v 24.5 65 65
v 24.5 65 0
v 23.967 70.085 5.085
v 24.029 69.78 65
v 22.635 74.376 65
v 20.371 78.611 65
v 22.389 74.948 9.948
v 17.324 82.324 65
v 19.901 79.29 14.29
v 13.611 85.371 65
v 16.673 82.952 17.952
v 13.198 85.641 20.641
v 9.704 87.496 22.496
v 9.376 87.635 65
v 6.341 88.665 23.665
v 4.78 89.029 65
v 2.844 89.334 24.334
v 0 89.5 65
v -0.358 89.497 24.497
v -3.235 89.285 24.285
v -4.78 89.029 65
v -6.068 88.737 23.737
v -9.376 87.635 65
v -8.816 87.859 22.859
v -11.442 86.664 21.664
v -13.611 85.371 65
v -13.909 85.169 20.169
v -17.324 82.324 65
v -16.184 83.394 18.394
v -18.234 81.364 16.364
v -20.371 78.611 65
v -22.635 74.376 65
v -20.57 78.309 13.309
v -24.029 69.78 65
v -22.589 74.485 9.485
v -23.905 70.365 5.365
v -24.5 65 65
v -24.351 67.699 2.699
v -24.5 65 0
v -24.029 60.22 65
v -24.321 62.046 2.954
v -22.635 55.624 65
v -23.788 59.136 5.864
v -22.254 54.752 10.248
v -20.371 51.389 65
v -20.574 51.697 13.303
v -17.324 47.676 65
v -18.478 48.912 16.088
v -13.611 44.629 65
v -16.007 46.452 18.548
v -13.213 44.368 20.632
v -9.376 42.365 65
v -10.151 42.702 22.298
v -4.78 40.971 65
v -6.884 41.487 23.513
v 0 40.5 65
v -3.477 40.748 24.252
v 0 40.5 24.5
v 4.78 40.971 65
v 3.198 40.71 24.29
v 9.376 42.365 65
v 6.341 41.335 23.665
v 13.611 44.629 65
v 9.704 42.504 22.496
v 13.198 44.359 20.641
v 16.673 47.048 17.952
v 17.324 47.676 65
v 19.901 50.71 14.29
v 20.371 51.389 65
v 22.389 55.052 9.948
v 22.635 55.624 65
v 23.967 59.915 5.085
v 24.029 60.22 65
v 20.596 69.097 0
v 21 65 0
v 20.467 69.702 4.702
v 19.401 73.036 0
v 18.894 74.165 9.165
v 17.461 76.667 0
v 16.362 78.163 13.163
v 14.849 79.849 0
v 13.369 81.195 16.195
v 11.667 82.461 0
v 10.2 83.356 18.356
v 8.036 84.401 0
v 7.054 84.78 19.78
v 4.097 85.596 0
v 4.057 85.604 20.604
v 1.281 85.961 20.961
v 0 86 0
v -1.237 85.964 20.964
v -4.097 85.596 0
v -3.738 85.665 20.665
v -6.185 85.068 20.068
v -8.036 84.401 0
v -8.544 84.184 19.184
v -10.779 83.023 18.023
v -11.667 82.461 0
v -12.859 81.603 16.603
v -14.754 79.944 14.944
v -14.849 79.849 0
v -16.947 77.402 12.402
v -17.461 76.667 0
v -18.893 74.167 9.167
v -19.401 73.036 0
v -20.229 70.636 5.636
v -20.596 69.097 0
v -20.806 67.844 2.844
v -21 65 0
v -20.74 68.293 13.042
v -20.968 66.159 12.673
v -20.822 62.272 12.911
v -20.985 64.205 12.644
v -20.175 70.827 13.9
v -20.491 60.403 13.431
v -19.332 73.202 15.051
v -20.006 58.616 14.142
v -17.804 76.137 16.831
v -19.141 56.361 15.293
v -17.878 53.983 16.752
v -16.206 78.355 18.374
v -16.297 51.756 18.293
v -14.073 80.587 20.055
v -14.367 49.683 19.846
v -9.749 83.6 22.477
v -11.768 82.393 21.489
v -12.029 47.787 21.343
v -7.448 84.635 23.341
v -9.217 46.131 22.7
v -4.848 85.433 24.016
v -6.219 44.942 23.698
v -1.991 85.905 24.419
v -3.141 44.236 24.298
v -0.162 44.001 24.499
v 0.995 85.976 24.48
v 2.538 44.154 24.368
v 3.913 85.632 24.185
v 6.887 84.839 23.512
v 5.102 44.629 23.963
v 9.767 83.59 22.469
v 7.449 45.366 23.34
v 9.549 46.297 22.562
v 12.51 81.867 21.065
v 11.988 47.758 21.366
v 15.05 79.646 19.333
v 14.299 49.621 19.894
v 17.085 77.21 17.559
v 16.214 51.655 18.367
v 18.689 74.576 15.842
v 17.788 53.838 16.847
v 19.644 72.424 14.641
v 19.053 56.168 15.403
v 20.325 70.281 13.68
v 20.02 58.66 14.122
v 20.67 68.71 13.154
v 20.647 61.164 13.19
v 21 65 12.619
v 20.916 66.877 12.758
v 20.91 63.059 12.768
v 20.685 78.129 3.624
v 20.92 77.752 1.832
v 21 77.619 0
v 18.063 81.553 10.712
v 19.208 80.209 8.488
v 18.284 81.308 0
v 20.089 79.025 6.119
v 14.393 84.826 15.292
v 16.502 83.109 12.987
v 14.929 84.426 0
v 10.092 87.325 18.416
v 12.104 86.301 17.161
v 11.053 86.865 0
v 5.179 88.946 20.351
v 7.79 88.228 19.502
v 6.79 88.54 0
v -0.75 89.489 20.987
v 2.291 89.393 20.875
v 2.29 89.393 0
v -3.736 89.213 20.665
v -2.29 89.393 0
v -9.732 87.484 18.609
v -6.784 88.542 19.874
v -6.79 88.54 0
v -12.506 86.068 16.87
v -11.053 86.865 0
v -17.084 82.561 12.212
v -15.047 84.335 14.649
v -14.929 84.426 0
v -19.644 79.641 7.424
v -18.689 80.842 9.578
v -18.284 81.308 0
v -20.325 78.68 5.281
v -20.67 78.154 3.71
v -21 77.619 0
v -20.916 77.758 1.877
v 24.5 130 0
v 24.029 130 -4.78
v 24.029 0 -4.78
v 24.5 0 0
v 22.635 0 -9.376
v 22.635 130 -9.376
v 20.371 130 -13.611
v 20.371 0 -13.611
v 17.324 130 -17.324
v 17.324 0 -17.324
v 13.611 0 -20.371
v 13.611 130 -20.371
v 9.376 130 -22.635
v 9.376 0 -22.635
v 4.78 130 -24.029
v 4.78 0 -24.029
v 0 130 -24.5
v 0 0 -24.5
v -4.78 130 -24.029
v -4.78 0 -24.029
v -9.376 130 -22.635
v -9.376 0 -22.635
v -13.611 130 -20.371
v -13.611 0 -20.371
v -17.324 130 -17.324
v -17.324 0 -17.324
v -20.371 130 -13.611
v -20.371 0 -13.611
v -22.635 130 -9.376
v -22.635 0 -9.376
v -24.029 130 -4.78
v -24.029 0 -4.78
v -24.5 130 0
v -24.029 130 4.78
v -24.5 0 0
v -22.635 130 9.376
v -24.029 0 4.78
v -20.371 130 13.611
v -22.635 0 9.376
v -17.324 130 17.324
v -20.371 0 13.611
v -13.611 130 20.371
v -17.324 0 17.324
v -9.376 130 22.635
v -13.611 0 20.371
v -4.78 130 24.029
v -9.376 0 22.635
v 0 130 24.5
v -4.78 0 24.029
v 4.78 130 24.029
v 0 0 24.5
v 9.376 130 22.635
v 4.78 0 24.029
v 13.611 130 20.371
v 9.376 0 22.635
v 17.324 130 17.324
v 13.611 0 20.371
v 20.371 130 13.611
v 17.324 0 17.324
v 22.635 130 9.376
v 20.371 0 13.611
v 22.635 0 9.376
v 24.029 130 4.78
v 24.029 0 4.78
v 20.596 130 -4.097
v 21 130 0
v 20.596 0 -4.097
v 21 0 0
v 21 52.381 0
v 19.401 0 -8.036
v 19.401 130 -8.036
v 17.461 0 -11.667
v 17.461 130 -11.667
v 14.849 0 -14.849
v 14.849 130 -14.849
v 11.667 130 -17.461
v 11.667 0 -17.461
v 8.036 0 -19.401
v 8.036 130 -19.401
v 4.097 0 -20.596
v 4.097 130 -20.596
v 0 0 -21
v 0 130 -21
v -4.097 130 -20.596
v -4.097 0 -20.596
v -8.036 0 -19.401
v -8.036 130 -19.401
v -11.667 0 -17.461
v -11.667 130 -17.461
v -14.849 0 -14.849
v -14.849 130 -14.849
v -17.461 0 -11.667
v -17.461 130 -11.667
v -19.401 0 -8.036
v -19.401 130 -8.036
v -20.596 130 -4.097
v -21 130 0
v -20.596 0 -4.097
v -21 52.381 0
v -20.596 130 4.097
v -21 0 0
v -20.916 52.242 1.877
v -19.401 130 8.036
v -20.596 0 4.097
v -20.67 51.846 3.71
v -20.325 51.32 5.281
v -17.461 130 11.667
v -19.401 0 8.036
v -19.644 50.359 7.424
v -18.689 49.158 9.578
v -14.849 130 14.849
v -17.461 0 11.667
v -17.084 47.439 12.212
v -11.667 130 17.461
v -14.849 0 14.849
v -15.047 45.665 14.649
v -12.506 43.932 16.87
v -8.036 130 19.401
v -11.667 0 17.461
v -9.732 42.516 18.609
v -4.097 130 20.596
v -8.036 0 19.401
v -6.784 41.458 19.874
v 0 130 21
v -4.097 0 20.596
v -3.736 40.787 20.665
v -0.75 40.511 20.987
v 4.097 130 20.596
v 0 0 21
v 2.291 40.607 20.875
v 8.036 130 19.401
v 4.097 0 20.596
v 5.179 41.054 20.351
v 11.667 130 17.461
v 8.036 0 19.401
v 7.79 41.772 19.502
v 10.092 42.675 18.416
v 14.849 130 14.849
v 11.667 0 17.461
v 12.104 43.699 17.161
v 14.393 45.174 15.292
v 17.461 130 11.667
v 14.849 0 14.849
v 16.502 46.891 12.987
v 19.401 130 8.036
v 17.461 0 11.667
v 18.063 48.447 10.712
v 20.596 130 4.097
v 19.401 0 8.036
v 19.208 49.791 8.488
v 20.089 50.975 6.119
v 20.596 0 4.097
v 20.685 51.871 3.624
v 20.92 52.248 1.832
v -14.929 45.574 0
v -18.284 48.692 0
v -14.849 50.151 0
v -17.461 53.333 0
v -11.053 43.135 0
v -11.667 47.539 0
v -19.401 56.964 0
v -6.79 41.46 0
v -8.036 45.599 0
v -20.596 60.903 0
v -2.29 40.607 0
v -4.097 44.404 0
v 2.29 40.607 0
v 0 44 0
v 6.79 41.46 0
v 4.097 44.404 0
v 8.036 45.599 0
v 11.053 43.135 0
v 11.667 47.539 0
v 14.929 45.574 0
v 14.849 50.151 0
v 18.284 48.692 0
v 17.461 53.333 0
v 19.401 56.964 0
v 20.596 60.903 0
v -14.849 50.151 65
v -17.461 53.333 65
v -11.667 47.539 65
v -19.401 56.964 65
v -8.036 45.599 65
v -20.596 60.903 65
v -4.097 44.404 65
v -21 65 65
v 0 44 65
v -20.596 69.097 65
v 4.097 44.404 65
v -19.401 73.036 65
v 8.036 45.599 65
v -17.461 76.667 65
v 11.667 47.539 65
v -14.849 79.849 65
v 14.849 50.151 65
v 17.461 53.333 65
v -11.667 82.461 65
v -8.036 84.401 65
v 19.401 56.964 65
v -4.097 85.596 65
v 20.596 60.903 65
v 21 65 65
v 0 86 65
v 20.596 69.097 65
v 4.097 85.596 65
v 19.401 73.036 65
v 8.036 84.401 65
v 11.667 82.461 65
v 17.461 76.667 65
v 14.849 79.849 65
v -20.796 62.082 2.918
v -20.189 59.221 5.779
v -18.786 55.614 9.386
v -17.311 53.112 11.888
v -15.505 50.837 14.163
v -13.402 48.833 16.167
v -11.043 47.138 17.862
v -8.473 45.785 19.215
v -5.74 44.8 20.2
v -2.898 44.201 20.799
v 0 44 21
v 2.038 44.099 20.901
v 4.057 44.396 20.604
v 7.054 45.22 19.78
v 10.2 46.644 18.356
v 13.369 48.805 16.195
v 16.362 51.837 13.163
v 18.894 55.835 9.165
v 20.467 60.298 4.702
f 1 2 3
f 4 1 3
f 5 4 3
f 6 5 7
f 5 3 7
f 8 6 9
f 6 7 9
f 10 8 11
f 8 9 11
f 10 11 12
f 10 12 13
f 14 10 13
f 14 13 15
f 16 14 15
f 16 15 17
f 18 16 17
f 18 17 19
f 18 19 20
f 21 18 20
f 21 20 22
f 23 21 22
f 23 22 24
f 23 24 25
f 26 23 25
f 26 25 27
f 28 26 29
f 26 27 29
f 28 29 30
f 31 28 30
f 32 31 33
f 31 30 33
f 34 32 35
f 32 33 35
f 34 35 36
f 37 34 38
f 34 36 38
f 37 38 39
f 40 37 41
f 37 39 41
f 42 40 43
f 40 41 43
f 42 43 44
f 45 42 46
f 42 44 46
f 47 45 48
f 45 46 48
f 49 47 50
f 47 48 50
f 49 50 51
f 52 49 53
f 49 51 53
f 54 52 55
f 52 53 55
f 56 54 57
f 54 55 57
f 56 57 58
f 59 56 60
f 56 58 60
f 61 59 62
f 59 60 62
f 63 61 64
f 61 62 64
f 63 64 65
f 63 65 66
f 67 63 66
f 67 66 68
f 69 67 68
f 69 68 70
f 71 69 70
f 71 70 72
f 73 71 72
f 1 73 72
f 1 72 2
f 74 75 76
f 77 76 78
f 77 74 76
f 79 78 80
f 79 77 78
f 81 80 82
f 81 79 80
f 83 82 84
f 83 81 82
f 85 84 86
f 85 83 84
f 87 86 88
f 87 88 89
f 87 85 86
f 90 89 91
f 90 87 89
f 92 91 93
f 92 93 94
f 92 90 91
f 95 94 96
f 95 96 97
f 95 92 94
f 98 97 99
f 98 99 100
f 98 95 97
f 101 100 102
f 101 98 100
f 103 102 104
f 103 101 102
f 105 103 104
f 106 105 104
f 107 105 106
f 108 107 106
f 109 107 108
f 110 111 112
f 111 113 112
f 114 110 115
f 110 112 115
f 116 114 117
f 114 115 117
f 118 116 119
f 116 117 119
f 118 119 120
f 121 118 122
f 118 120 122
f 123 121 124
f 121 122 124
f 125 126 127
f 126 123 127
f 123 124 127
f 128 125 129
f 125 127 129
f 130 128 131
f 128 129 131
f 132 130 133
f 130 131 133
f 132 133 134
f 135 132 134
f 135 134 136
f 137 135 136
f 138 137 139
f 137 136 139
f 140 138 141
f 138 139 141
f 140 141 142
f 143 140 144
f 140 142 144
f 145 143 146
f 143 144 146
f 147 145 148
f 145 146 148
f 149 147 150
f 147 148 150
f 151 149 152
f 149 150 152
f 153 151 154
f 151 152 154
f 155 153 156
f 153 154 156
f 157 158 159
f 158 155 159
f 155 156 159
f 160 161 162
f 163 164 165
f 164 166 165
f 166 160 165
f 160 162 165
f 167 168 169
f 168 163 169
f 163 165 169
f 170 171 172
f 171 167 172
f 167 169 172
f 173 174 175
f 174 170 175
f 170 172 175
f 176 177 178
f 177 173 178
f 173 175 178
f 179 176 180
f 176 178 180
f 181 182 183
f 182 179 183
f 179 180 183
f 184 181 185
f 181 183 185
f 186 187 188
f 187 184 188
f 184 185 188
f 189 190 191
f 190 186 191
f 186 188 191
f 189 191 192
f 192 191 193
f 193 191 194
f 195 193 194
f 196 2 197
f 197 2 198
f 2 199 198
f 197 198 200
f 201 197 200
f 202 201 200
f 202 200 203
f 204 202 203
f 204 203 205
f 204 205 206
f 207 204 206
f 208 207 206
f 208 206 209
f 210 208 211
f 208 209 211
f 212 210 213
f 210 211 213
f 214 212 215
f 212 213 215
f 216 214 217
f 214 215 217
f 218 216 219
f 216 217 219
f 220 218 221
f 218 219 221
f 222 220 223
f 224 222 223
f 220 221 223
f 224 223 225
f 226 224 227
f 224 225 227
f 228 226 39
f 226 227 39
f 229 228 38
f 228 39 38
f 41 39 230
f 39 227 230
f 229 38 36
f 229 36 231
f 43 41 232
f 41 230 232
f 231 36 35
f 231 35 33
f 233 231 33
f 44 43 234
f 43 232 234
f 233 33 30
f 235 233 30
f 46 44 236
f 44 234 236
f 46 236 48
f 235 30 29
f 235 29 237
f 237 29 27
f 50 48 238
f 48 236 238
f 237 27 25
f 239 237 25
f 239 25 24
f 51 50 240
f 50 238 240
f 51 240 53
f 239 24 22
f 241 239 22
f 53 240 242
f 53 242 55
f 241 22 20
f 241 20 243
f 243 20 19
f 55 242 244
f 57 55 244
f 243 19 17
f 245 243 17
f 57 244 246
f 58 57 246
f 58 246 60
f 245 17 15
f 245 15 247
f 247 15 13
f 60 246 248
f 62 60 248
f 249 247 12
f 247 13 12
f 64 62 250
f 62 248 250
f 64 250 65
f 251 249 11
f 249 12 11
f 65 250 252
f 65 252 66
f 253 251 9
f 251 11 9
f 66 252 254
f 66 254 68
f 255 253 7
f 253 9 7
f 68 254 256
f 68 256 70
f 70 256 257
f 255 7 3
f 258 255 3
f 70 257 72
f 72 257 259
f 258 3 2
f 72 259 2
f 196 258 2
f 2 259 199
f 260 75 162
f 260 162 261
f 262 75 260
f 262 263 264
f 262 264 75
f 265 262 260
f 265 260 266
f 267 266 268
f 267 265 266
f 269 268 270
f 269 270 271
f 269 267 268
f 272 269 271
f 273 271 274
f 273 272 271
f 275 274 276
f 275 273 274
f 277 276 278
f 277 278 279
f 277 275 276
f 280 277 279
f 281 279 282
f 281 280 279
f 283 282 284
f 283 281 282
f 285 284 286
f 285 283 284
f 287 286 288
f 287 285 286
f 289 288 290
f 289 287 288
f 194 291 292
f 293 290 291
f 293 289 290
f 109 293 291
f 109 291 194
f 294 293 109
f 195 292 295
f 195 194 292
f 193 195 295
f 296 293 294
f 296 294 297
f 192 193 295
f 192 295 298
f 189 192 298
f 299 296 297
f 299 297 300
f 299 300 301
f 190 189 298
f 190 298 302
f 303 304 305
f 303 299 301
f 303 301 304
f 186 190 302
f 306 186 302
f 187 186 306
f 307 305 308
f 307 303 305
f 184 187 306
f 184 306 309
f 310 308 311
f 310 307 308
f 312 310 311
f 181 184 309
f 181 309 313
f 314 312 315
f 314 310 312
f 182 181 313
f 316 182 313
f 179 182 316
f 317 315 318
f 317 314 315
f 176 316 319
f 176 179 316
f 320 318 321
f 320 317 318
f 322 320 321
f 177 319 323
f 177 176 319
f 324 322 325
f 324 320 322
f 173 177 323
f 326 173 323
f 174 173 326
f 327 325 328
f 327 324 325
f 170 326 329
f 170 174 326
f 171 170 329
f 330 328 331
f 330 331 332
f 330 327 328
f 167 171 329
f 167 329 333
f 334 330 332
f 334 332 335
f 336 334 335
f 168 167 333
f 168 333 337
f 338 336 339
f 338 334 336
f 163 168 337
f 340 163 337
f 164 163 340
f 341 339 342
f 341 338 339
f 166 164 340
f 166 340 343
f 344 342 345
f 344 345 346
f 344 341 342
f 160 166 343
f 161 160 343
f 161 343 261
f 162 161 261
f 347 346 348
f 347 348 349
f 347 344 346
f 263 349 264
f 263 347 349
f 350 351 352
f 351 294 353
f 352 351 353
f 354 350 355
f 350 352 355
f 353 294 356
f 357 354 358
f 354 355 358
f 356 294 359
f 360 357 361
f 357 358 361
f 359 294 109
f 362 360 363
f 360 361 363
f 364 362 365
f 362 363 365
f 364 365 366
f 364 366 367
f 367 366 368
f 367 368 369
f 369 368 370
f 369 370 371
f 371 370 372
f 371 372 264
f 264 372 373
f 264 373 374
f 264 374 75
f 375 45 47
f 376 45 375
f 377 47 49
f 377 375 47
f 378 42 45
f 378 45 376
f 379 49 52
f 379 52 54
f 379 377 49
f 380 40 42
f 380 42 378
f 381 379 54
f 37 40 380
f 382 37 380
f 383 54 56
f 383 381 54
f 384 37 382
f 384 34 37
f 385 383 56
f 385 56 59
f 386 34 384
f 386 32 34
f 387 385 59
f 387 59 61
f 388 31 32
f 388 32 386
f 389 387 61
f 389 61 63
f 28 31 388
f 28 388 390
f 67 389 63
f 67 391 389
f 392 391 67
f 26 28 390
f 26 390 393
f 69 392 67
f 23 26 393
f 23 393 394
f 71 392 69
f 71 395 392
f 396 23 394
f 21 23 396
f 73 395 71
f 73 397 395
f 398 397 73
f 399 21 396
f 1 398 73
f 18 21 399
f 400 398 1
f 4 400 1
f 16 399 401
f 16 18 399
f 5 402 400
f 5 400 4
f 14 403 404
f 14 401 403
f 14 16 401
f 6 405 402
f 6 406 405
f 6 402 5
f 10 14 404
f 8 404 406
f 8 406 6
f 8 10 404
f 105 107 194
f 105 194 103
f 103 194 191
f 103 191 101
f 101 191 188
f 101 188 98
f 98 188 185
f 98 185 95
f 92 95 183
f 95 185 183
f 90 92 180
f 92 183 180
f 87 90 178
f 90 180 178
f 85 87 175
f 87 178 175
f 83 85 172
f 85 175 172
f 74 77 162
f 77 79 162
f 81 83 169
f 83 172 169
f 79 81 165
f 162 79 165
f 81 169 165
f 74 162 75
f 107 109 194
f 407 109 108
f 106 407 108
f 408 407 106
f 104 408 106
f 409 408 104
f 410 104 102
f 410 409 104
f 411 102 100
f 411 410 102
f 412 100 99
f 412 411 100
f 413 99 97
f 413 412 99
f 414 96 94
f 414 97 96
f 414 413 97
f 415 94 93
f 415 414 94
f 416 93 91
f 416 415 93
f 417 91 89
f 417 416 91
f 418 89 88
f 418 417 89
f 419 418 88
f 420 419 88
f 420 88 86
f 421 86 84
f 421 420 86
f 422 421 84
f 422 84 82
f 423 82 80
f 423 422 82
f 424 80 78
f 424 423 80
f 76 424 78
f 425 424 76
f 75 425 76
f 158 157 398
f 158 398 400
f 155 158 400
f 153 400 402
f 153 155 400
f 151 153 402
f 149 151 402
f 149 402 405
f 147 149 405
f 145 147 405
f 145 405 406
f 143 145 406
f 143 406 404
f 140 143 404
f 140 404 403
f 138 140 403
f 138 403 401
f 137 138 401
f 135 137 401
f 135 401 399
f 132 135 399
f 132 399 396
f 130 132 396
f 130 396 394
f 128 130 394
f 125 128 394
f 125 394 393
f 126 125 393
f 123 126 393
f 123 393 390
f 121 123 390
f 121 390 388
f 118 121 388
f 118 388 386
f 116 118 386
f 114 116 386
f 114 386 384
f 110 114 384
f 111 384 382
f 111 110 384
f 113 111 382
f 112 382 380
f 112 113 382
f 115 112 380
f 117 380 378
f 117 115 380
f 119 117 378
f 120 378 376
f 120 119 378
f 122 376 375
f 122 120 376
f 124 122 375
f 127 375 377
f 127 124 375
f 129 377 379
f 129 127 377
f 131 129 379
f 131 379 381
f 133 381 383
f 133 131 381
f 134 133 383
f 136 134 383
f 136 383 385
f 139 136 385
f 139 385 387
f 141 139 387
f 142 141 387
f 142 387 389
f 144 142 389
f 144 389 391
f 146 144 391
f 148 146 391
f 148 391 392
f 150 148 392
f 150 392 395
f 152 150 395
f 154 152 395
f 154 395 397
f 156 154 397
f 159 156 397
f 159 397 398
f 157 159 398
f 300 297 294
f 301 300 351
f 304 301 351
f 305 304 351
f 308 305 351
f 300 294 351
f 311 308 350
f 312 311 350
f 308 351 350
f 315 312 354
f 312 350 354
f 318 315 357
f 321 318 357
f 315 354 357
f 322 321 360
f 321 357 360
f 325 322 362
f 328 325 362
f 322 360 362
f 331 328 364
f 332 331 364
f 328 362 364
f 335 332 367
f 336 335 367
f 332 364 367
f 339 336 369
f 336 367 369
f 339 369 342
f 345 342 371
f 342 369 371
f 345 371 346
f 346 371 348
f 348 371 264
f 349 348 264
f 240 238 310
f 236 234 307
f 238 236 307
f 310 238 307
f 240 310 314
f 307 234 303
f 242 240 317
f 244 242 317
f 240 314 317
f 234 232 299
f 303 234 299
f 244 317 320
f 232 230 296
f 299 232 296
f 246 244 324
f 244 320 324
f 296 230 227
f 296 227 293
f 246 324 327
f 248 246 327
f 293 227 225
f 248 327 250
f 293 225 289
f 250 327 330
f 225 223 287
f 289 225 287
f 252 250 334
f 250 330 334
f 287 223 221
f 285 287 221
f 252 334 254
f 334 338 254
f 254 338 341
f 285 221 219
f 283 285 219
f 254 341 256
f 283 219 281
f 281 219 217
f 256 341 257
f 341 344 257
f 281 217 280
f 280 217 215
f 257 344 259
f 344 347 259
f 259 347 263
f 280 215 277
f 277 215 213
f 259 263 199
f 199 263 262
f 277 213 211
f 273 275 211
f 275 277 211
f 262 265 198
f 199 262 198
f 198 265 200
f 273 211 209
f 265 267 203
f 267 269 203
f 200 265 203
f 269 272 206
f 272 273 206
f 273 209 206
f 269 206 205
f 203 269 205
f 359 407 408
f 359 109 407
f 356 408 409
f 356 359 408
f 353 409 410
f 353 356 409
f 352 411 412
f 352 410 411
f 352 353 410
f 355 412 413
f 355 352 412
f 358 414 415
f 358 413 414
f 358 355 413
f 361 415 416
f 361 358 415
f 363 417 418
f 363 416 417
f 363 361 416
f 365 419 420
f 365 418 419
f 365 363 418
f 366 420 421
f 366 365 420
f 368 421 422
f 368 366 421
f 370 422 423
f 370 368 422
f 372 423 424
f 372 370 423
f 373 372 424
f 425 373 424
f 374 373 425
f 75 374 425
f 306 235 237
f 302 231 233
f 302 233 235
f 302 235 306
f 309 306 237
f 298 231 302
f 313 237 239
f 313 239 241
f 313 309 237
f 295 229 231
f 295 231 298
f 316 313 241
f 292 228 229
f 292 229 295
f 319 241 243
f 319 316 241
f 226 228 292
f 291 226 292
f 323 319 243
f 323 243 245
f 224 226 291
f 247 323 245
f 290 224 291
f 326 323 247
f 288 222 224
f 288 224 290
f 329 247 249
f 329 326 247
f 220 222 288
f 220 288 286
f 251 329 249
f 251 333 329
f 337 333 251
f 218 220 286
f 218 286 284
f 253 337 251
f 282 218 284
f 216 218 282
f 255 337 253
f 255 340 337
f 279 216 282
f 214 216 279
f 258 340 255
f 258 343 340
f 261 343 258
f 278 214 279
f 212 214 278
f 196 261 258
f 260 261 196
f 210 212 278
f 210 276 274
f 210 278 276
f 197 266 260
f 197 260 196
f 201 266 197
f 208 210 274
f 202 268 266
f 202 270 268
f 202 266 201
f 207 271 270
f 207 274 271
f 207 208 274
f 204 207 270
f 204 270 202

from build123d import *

# Parameters (mm, degrees)
SKETCH1_R           = 24.5
SKETCH1_R_2         = 21
BOSS_EXTRUDE1_DEPTH = 130
SKETCH3_R           = 24.5
SKETCH3_R_2         = 21
BOSS_EXTRUDE2_DEPTH = 65


with BuildPart() as part:
    # Sketch1 → Boss-Extrude1 (new body)
    with BuildSketch(Plane(origin=(0, 0, 0), x_dir=(1, 0, 0), z_dir=(0, 1, 0))):
        Circle(SKETCH1_R)
        Circle(SKETCH1_R_2, mode=Mode.SUBTRACT)
    extrude(amount=BOSS_EXTRUDE1_DEPTH)

    # Sketch3 → Boss-Extrude2 (add)
    with BuildSketch(Plane.XY):
        with Locations((0, 65)):
            Circle(SKETCH3_R)
        with Locations((0, 65)):
            Circle(SKETCH3_R_2, mode=Mode.SUBTRACT)
    extrude(amount=BOSS_EXTRUDE2_DEPTH)


solid = part.part
